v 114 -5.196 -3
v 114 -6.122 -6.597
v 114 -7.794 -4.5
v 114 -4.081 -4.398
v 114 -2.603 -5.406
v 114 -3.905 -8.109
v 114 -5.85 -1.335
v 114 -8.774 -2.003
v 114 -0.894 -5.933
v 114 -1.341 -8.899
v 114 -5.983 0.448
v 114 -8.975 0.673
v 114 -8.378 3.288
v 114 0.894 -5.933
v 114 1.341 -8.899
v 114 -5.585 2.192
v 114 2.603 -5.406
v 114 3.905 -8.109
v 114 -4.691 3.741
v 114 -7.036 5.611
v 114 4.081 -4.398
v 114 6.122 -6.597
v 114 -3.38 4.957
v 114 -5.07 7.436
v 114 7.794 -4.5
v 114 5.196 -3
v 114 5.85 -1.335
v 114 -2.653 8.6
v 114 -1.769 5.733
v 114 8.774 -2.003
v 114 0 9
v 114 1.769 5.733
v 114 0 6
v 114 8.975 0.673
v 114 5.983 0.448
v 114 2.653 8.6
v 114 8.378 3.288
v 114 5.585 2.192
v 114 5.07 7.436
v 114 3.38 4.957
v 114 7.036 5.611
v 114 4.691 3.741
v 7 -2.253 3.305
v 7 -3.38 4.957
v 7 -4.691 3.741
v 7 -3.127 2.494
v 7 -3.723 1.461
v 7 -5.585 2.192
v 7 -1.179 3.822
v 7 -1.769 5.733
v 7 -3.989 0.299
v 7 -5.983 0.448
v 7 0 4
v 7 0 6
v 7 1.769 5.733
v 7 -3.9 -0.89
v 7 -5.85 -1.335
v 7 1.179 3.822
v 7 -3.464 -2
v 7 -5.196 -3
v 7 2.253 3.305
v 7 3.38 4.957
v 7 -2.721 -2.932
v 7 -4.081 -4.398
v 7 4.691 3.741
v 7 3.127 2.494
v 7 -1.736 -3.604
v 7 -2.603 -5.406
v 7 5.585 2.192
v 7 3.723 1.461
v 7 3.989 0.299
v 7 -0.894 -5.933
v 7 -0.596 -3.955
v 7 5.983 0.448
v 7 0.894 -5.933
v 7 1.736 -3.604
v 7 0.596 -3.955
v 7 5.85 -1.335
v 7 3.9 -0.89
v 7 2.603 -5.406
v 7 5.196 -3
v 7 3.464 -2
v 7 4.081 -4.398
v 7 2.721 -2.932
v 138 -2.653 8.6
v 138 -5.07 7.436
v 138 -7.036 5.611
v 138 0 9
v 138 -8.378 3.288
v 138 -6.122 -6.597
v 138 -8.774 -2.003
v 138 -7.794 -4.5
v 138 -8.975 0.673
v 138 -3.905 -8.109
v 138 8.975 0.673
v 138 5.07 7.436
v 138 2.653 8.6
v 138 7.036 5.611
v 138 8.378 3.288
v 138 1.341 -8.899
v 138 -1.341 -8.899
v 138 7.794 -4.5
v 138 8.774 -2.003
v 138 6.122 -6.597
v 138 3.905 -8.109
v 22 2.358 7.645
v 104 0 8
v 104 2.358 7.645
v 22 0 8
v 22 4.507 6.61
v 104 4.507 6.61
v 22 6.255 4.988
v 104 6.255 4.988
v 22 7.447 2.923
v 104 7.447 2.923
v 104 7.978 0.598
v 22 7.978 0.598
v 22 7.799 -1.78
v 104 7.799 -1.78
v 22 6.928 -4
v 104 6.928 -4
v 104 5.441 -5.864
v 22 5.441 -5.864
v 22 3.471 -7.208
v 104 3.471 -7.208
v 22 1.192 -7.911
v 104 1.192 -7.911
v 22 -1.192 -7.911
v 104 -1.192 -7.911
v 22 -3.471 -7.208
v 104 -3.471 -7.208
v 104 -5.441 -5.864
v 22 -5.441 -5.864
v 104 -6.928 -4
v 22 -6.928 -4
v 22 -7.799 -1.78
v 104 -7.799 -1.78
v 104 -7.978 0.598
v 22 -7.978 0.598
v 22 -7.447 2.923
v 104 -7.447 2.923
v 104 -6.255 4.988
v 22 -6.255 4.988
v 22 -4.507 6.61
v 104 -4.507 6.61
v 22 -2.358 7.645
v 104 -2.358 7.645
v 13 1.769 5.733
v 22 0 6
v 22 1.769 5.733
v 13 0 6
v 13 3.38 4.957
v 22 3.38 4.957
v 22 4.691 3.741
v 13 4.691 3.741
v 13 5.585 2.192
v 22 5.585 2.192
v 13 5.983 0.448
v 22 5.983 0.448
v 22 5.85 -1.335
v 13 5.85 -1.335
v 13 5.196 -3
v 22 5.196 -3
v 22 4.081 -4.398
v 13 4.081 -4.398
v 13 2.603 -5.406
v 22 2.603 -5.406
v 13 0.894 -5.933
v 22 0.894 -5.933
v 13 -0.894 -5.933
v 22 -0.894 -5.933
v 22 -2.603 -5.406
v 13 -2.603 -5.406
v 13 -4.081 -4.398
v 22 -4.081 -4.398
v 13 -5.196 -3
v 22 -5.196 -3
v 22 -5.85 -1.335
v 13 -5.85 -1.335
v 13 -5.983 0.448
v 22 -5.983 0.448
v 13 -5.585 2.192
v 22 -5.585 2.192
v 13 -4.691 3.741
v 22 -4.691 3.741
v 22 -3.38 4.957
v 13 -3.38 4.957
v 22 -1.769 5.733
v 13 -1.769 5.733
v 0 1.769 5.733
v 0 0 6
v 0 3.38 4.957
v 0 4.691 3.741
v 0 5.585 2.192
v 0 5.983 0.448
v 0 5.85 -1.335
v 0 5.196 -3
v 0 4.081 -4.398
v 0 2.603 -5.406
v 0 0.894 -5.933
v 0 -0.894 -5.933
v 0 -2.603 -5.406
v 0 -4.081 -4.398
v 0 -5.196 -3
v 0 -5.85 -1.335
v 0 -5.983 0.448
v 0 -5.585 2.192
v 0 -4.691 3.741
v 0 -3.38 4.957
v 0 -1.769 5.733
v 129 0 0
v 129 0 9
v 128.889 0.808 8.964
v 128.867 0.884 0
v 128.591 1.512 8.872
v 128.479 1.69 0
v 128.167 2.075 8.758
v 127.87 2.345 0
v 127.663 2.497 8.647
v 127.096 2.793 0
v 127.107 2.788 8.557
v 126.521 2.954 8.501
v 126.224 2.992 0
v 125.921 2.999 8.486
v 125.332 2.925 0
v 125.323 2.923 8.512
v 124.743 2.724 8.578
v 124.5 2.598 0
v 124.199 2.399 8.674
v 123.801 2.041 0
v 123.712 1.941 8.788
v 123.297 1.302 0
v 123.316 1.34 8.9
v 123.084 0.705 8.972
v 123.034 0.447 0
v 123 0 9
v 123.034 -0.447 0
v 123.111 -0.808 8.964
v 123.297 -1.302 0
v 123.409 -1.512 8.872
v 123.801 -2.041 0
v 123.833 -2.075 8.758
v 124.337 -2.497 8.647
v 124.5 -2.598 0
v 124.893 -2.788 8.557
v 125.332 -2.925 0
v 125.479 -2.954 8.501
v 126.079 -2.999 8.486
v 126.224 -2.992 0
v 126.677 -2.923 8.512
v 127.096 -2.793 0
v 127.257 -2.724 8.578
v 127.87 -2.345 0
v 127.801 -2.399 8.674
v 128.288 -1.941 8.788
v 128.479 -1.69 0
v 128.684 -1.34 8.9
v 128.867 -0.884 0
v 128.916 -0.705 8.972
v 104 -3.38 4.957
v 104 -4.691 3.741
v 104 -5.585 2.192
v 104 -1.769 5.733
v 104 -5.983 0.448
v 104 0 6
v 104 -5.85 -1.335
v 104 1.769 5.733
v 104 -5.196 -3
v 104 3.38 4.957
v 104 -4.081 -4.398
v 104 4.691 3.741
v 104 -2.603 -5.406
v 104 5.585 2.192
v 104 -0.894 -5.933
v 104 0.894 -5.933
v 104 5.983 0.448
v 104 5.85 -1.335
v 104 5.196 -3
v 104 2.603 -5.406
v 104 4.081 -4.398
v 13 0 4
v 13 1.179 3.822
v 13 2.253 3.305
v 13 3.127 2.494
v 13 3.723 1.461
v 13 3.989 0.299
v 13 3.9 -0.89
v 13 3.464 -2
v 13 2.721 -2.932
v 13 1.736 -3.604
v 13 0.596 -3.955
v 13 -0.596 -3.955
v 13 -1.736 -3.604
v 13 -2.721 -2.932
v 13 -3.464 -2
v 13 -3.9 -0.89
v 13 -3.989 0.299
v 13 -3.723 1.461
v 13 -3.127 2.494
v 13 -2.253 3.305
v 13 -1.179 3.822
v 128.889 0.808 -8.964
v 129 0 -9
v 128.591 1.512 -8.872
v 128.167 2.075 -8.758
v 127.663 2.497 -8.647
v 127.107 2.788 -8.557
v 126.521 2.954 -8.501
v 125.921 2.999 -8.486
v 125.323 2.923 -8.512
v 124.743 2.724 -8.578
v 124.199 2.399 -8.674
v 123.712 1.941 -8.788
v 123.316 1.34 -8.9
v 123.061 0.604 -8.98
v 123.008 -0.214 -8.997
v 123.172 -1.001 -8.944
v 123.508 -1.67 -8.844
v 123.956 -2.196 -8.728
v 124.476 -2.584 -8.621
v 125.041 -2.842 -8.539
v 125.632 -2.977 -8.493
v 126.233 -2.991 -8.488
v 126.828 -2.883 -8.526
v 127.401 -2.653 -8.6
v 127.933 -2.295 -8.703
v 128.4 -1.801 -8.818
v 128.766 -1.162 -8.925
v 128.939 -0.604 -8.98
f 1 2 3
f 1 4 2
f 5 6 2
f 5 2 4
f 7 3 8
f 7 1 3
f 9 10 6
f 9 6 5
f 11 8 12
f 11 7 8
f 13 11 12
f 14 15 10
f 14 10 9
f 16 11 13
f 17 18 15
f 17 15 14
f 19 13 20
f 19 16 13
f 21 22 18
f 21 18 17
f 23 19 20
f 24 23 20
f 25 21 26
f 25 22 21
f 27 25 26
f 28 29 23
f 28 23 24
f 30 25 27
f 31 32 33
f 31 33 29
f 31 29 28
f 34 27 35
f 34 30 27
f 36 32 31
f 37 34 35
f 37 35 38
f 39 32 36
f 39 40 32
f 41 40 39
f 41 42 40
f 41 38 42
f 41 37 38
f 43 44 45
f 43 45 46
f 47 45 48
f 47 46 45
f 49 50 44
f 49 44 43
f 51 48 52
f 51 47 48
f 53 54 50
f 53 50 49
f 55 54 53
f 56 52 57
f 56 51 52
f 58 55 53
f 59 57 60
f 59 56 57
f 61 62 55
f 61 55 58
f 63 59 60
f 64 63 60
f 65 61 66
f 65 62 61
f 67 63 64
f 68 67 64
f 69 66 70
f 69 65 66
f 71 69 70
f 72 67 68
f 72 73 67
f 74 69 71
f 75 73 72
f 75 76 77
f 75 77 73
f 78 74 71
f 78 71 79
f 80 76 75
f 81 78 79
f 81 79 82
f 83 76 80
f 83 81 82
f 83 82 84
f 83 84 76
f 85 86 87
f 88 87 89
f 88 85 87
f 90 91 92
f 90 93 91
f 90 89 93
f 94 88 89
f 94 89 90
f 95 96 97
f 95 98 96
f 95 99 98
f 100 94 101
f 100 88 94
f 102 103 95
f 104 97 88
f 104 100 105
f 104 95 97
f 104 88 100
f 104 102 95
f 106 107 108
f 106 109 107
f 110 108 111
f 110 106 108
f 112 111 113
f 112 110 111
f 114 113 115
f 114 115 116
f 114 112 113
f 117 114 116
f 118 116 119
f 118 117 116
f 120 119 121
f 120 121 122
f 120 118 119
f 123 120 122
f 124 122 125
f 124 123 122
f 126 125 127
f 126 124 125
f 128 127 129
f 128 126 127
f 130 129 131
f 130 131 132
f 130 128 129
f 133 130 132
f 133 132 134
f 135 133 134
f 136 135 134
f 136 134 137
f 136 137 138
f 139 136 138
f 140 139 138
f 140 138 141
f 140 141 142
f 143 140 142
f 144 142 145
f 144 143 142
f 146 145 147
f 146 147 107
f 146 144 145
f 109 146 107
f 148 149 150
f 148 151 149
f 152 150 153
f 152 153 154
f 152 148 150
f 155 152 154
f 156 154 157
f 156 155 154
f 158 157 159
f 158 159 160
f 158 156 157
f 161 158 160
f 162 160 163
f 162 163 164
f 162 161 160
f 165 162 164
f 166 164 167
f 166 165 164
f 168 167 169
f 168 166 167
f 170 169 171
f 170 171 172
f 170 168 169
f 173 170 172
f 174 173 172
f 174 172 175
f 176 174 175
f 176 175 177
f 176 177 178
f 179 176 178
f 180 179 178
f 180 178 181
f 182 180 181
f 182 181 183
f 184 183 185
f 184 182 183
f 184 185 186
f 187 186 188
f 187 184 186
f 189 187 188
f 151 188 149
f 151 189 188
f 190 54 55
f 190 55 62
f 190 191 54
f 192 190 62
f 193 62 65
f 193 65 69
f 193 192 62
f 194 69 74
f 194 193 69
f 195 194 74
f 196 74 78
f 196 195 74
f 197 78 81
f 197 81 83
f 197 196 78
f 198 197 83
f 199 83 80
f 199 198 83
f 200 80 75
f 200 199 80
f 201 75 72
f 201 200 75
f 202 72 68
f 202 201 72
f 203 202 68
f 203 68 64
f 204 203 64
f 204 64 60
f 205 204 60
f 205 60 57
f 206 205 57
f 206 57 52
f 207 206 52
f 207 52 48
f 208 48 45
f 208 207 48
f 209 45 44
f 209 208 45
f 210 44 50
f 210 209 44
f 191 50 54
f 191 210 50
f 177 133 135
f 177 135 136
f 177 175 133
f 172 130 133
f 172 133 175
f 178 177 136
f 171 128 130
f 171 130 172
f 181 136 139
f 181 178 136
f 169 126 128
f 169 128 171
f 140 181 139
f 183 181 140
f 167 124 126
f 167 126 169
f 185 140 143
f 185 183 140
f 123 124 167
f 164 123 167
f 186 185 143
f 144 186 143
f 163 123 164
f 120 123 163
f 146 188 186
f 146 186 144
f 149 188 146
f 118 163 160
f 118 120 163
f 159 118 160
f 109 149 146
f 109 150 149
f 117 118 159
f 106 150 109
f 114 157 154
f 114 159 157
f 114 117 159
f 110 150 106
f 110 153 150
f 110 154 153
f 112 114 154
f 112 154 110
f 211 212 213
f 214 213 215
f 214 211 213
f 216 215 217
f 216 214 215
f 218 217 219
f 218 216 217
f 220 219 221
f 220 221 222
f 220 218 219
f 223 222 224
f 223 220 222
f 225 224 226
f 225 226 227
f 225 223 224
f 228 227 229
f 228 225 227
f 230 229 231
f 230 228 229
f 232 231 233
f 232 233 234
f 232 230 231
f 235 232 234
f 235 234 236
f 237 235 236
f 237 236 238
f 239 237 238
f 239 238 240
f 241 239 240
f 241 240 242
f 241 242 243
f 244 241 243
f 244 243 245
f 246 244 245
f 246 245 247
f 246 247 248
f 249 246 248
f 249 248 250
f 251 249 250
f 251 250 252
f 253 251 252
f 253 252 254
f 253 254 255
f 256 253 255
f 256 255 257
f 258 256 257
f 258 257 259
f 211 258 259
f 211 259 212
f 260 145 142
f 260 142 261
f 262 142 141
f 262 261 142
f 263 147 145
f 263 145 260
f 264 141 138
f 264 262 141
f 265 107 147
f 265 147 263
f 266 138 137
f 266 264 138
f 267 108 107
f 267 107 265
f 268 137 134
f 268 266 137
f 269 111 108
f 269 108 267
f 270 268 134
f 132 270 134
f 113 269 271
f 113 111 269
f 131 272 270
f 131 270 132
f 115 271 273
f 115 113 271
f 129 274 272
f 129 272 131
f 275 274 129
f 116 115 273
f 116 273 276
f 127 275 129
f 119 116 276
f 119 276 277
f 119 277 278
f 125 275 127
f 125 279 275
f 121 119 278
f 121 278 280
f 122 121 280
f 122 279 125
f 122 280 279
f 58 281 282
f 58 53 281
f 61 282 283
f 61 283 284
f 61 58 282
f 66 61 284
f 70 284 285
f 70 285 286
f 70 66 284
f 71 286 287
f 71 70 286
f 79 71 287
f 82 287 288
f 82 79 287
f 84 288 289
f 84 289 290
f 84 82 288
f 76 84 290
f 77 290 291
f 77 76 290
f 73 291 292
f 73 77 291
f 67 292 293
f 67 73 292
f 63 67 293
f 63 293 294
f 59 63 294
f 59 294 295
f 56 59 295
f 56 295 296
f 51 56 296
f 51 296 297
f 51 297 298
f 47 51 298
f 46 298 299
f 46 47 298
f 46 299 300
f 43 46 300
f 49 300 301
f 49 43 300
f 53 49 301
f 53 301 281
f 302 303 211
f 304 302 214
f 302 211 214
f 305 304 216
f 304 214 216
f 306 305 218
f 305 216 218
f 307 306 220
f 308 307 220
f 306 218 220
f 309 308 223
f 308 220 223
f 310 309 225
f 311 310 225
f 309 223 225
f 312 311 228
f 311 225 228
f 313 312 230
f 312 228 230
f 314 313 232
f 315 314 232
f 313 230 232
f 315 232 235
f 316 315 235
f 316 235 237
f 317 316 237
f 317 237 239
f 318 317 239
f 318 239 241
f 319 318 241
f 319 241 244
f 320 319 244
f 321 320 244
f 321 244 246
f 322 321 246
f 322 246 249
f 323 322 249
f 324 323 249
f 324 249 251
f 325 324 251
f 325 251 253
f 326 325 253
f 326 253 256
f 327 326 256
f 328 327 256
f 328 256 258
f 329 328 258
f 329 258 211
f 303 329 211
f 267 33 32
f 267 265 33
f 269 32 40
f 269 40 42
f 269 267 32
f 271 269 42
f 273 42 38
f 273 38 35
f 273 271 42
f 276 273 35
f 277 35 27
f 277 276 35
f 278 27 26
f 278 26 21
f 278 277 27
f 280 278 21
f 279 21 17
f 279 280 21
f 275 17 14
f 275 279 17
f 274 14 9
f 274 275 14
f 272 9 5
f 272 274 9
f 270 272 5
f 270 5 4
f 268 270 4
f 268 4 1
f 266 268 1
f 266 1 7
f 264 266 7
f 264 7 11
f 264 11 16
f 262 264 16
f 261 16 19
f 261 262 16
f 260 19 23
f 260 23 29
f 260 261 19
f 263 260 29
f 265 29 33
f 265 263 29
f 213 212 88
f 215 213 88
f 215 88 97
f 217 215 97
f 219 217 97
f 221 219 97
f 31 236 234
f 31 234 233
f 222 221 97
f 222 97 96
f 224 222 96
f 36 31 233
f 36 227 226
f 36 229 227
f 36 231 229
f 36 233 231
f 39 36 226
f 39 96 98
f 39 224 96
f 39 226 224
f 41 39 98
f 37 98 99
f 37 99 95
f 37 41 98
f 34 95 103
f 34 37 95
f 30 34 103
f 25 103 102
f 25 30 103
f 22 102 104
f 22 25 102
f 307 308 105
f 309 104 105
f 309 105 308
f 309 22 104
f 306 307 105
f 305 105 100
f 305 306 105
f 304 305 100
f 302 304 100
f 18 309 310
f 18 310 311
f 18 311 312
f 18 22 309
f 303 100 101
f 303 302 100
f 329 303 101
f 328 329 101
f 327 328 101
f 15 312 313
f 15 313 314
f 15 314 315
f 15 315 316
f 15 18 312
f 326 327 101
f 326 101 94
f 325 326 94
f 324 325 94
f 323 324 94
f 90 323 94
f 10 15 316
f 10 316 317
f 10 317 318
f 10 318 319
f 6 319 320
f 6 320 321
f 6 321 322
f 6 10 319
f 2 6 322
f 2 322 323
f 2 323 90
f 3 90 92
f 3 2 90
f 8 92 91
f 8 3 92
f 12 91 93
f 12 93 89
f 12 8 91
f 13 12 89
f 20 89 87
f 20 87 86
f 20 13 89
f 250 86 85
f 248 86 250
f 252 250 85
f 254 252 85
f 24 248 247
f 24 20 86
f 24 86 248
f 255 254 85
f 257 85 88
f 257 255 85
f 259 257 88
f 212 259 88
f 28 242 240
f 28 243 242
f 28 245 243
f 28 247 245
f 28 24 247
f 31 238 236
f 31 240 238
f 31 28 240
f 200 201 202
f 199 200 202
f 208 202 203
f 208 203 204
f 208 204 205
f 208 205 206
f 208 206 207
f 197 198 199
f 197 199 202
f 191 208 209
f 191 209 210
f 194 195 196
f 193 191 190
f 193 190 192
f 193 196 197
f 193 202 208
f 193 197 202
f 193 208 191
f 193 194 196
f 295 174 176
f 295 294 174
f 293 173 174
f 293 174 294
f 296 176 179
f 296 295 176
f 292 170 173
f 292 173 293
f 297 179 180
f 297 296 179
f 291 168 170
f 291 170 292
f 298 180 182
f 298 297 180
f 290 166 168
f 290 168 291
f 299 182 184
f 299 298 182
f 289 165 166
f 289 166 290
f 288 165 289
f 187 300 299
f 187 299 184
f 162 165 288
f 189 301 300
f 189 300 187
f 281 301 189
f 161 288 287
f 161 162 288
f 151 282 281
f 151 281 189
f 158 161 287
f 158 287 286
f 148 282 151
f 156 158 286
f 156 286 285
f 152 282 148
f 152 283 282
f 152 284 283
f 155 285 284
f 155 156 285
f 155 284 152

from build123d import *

# Parameters (mm, degrees)
F2_R          = 3
F3_DEPTH      = 9.001
F3_DEPTH_BACK = 9.001


with BuildPart() as f1:
    # F0 (on Front) → F1 (revolve)
    with BuildSketch(Plane.XZ):
        Polygon((0, 6), (0, 0), (138, 0), (138, 9), (114, 9), (114, 6), (104, 6), (104, 8), (22, 8), (22, 6), (13, 6), (13, 4), (7, 4), (7, 6), align=None)
    revolve(axis=Axis((69, 0, 0), (-1, 0, 0)))

    # F2 (on Top) → F3 (cut, two sides)
    with BuildSketch(Plane.XY) as f3_sk:
        with Locations((126, 0)):
            Circle(F2_R)
    extrude(amount=-F3_DEPTH, mode=Mode.SUBTRACT)
    extrude(f3_sk.sketch, amount=F3_DEPTH_BACK, mode=Mode.SUBTRACT)


solid = f1.part
